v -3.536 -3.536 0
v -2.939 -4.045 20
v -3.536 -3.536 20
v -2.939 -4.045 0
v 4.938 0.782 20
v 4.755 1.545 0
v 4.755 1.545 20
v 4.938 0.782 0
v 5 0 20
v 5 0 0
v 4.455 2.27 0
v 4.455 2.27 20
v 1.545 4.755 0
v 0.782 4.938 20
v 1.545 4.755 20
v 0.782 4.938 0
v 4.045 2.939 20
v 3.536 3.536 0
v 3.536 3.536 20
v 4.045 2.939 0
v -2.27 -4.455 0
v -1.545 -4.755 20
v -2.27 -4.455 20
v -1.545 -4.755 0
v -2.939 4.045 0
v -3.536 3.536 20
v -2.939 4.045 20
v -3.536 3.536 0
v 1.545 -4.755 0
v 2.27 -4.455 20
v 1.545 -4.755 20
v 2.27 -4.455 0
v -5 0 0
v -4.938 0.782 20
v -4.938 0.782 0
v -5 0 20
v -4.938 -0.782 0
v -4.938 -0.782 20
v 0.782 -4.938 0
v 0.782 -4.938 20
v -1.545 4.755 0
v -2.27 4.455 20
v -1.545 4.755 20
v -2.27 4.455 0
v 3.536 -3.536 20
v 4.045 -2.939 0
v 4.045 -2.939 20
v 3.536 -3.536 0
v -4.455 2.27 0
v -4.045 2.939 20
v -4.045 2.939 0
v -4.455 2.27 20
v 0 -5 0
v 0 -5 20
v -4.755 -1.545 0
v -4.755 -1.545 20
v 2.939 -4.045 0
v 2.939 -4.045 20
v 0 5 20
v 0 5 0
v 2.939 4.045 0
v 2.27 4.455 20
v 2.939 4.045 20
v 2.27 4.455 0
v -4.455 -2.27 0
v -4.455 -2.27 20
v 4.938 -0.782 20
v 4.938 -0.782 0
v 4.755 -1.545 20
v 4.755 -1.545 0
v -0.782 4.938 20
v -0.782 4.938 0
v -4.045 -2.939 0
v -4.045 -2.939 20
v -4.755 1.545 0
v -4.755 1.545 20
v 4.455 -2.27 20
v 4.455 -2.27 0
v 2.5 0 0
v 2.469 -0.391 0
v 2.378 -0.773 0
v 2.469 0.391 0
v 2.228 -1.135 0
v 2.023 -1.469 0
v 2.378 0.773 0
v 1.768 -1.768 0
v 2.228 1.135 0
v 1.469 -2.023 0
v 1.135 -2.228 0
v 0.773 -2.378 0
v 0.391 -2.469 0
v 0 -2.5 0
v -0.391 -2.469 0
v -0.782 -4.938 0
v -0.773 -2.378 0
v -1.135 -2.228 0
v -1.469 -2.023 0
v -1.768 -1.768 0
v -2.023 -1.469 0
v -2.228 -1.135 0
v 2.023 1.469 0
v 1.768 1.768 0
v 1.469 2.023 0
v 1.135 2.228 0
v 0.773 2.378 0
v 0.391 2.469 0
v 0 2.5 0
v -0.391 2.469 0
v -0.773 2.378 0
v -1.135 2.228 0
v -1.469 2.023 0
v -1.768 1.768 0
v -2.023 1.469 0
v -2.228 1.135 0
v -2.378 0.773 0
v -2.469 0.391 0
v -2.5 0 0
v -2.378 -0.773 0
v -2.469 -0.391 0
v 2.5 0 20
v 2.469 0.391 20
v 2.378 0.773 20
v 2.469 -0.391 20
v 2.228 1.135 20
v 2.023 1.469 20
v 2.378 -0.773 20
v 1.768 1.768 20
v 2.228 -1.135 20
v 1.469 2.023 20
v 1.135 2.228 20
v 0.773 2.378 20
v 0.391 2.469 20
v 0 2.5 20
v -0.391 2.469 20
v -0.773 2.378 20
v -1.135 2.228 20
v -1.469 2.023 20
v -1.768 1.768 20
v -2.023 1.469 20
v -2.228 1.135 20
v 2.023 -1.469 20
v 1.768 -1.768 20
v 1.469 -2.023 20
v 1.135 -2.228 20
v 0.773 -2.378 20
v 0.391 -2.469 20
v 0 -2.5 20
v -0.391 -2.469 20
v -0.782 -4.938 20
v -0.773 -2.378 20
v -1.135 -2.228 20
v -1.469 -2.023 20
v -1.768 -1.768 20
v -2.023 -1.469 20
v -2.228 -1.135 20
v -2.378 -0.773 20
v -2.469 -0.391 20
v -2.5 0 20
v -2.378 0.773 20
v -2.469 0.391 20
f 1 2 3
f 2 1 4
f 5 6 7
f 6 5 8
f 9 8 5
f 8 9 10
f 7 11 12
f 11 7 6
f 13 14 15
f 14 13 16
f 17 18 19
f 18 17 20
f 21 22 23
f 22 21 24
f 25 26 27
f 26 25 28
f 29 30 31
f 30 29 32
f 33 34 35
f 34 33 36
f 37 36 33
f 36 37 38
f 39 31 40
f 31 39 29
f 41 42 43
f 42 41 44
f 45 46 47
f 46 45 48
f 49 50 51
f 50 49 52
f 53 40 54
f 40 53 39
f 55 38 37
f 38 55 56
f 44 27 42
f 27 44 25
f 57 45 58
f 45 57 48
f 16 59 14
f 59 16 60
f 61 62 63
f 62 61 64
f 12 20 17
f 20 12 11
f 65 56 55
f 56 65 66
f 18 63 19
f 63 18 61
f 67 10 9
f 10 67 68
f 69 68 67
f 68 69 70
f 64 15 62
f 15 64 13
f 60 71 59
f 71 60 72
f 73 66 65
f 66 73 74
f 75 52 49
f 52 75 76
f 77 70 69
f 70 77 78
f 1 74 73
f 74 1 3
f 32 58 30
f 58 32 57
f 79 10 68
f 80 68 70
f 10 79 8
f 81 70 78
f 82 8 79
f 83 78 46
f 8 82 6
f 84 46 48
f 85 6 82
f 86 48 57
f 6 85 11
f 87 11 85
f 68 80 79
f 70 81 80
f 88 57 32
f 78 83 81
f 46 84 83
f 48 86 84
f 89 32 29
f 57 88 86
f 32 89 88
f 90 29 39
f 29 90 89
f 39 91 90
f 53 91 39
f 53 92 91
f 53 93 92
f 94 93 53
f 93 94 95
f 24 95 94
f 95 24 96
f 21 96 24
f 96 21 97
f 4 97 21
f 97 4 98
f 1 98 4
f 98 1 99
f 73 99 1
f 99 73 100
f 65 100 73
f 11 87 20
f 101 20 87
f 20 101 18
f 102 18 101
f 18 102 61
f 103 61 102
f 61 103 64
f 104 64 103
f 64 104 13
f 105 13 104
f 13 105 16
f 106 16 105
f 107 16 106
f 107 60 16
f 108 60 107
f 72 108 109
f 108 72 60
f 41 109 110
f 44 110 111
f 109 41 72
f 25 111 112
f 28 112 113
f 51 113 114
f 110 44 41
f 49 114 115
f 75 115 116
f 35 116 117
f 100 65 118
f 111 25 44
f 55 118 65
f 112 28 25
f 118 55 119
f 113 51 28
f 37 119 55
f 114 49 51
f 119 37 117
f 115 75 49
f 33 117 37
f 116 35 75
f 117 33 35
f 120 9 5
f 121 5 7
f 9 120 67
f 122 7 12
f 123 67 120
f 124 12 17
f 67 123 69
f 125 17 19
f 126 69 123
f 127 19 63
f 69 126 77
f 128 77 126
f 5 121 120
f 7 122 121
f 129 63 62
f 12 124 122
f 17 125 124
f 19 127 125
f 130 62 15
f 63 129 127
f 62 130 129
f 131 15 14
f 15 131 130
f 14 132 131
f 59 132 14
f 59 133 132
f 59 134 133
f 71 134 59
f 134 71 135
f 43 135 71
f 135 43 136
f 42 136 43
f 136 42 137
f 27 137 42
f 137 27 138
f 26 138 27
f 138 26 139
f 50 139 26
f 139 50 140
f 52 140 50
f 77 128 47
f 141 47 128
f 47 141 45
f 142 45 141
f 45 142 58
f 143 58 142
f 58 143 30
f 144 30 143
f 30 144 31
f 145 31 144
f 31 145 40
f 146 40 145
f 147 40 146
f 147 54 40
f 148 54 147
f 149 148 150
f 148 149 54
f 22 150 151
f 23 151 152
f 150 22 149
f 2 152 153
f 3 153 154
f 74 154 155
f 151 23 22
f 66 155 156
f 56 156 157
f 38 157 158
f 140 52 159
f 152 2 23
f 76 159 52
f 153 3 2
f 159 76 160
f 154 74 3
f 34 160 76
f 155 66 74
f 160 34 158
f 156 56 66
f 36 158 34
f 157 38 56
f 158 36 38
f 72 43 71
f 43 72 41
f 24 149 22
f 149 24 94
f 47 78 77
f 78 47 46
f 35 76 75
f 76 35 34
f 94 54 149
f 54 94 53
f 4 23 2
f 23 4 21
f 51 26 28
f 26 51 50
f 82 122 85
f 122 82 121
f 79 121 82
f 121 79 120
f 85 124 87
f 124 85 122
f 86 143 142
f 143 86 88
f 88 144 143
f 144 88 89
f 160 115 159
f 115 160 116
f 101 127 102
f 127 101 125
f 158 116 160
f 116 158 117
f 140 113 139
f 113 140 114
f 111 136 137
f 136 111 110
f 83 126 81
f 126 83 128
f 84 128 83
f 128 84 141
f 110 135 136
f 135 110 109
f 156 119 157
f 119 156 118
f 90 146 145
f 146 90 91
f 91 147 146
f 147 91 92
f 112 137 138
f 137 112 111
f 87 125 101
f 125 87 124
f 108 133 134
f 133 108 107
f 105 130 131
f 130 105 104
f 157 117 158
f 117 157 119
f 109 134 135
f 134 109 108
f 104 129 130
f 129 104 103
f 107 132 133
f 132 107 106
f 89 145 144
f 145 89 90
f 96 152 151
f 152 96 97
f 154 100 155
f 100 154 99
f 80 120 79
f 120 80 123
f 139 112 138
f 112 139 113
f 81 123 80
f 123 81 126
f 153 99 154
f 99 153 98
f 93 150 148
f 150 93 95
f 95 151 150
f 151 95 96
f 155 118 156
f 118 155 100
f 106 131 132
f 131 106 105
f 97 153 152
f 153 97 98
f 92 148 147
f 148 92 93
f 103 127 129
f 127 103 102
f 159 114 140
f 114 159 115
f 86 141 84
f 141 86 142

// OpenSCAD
$fn=40; // resolution of the arcs

scale([10,10,10]) { // cm to mm scaling

	difference() {
		cylinder(h = 2, r=0.5);
		translate([0,0,-0.1])
		cylinder(h = 2.2, r=0.25);
	}

}
